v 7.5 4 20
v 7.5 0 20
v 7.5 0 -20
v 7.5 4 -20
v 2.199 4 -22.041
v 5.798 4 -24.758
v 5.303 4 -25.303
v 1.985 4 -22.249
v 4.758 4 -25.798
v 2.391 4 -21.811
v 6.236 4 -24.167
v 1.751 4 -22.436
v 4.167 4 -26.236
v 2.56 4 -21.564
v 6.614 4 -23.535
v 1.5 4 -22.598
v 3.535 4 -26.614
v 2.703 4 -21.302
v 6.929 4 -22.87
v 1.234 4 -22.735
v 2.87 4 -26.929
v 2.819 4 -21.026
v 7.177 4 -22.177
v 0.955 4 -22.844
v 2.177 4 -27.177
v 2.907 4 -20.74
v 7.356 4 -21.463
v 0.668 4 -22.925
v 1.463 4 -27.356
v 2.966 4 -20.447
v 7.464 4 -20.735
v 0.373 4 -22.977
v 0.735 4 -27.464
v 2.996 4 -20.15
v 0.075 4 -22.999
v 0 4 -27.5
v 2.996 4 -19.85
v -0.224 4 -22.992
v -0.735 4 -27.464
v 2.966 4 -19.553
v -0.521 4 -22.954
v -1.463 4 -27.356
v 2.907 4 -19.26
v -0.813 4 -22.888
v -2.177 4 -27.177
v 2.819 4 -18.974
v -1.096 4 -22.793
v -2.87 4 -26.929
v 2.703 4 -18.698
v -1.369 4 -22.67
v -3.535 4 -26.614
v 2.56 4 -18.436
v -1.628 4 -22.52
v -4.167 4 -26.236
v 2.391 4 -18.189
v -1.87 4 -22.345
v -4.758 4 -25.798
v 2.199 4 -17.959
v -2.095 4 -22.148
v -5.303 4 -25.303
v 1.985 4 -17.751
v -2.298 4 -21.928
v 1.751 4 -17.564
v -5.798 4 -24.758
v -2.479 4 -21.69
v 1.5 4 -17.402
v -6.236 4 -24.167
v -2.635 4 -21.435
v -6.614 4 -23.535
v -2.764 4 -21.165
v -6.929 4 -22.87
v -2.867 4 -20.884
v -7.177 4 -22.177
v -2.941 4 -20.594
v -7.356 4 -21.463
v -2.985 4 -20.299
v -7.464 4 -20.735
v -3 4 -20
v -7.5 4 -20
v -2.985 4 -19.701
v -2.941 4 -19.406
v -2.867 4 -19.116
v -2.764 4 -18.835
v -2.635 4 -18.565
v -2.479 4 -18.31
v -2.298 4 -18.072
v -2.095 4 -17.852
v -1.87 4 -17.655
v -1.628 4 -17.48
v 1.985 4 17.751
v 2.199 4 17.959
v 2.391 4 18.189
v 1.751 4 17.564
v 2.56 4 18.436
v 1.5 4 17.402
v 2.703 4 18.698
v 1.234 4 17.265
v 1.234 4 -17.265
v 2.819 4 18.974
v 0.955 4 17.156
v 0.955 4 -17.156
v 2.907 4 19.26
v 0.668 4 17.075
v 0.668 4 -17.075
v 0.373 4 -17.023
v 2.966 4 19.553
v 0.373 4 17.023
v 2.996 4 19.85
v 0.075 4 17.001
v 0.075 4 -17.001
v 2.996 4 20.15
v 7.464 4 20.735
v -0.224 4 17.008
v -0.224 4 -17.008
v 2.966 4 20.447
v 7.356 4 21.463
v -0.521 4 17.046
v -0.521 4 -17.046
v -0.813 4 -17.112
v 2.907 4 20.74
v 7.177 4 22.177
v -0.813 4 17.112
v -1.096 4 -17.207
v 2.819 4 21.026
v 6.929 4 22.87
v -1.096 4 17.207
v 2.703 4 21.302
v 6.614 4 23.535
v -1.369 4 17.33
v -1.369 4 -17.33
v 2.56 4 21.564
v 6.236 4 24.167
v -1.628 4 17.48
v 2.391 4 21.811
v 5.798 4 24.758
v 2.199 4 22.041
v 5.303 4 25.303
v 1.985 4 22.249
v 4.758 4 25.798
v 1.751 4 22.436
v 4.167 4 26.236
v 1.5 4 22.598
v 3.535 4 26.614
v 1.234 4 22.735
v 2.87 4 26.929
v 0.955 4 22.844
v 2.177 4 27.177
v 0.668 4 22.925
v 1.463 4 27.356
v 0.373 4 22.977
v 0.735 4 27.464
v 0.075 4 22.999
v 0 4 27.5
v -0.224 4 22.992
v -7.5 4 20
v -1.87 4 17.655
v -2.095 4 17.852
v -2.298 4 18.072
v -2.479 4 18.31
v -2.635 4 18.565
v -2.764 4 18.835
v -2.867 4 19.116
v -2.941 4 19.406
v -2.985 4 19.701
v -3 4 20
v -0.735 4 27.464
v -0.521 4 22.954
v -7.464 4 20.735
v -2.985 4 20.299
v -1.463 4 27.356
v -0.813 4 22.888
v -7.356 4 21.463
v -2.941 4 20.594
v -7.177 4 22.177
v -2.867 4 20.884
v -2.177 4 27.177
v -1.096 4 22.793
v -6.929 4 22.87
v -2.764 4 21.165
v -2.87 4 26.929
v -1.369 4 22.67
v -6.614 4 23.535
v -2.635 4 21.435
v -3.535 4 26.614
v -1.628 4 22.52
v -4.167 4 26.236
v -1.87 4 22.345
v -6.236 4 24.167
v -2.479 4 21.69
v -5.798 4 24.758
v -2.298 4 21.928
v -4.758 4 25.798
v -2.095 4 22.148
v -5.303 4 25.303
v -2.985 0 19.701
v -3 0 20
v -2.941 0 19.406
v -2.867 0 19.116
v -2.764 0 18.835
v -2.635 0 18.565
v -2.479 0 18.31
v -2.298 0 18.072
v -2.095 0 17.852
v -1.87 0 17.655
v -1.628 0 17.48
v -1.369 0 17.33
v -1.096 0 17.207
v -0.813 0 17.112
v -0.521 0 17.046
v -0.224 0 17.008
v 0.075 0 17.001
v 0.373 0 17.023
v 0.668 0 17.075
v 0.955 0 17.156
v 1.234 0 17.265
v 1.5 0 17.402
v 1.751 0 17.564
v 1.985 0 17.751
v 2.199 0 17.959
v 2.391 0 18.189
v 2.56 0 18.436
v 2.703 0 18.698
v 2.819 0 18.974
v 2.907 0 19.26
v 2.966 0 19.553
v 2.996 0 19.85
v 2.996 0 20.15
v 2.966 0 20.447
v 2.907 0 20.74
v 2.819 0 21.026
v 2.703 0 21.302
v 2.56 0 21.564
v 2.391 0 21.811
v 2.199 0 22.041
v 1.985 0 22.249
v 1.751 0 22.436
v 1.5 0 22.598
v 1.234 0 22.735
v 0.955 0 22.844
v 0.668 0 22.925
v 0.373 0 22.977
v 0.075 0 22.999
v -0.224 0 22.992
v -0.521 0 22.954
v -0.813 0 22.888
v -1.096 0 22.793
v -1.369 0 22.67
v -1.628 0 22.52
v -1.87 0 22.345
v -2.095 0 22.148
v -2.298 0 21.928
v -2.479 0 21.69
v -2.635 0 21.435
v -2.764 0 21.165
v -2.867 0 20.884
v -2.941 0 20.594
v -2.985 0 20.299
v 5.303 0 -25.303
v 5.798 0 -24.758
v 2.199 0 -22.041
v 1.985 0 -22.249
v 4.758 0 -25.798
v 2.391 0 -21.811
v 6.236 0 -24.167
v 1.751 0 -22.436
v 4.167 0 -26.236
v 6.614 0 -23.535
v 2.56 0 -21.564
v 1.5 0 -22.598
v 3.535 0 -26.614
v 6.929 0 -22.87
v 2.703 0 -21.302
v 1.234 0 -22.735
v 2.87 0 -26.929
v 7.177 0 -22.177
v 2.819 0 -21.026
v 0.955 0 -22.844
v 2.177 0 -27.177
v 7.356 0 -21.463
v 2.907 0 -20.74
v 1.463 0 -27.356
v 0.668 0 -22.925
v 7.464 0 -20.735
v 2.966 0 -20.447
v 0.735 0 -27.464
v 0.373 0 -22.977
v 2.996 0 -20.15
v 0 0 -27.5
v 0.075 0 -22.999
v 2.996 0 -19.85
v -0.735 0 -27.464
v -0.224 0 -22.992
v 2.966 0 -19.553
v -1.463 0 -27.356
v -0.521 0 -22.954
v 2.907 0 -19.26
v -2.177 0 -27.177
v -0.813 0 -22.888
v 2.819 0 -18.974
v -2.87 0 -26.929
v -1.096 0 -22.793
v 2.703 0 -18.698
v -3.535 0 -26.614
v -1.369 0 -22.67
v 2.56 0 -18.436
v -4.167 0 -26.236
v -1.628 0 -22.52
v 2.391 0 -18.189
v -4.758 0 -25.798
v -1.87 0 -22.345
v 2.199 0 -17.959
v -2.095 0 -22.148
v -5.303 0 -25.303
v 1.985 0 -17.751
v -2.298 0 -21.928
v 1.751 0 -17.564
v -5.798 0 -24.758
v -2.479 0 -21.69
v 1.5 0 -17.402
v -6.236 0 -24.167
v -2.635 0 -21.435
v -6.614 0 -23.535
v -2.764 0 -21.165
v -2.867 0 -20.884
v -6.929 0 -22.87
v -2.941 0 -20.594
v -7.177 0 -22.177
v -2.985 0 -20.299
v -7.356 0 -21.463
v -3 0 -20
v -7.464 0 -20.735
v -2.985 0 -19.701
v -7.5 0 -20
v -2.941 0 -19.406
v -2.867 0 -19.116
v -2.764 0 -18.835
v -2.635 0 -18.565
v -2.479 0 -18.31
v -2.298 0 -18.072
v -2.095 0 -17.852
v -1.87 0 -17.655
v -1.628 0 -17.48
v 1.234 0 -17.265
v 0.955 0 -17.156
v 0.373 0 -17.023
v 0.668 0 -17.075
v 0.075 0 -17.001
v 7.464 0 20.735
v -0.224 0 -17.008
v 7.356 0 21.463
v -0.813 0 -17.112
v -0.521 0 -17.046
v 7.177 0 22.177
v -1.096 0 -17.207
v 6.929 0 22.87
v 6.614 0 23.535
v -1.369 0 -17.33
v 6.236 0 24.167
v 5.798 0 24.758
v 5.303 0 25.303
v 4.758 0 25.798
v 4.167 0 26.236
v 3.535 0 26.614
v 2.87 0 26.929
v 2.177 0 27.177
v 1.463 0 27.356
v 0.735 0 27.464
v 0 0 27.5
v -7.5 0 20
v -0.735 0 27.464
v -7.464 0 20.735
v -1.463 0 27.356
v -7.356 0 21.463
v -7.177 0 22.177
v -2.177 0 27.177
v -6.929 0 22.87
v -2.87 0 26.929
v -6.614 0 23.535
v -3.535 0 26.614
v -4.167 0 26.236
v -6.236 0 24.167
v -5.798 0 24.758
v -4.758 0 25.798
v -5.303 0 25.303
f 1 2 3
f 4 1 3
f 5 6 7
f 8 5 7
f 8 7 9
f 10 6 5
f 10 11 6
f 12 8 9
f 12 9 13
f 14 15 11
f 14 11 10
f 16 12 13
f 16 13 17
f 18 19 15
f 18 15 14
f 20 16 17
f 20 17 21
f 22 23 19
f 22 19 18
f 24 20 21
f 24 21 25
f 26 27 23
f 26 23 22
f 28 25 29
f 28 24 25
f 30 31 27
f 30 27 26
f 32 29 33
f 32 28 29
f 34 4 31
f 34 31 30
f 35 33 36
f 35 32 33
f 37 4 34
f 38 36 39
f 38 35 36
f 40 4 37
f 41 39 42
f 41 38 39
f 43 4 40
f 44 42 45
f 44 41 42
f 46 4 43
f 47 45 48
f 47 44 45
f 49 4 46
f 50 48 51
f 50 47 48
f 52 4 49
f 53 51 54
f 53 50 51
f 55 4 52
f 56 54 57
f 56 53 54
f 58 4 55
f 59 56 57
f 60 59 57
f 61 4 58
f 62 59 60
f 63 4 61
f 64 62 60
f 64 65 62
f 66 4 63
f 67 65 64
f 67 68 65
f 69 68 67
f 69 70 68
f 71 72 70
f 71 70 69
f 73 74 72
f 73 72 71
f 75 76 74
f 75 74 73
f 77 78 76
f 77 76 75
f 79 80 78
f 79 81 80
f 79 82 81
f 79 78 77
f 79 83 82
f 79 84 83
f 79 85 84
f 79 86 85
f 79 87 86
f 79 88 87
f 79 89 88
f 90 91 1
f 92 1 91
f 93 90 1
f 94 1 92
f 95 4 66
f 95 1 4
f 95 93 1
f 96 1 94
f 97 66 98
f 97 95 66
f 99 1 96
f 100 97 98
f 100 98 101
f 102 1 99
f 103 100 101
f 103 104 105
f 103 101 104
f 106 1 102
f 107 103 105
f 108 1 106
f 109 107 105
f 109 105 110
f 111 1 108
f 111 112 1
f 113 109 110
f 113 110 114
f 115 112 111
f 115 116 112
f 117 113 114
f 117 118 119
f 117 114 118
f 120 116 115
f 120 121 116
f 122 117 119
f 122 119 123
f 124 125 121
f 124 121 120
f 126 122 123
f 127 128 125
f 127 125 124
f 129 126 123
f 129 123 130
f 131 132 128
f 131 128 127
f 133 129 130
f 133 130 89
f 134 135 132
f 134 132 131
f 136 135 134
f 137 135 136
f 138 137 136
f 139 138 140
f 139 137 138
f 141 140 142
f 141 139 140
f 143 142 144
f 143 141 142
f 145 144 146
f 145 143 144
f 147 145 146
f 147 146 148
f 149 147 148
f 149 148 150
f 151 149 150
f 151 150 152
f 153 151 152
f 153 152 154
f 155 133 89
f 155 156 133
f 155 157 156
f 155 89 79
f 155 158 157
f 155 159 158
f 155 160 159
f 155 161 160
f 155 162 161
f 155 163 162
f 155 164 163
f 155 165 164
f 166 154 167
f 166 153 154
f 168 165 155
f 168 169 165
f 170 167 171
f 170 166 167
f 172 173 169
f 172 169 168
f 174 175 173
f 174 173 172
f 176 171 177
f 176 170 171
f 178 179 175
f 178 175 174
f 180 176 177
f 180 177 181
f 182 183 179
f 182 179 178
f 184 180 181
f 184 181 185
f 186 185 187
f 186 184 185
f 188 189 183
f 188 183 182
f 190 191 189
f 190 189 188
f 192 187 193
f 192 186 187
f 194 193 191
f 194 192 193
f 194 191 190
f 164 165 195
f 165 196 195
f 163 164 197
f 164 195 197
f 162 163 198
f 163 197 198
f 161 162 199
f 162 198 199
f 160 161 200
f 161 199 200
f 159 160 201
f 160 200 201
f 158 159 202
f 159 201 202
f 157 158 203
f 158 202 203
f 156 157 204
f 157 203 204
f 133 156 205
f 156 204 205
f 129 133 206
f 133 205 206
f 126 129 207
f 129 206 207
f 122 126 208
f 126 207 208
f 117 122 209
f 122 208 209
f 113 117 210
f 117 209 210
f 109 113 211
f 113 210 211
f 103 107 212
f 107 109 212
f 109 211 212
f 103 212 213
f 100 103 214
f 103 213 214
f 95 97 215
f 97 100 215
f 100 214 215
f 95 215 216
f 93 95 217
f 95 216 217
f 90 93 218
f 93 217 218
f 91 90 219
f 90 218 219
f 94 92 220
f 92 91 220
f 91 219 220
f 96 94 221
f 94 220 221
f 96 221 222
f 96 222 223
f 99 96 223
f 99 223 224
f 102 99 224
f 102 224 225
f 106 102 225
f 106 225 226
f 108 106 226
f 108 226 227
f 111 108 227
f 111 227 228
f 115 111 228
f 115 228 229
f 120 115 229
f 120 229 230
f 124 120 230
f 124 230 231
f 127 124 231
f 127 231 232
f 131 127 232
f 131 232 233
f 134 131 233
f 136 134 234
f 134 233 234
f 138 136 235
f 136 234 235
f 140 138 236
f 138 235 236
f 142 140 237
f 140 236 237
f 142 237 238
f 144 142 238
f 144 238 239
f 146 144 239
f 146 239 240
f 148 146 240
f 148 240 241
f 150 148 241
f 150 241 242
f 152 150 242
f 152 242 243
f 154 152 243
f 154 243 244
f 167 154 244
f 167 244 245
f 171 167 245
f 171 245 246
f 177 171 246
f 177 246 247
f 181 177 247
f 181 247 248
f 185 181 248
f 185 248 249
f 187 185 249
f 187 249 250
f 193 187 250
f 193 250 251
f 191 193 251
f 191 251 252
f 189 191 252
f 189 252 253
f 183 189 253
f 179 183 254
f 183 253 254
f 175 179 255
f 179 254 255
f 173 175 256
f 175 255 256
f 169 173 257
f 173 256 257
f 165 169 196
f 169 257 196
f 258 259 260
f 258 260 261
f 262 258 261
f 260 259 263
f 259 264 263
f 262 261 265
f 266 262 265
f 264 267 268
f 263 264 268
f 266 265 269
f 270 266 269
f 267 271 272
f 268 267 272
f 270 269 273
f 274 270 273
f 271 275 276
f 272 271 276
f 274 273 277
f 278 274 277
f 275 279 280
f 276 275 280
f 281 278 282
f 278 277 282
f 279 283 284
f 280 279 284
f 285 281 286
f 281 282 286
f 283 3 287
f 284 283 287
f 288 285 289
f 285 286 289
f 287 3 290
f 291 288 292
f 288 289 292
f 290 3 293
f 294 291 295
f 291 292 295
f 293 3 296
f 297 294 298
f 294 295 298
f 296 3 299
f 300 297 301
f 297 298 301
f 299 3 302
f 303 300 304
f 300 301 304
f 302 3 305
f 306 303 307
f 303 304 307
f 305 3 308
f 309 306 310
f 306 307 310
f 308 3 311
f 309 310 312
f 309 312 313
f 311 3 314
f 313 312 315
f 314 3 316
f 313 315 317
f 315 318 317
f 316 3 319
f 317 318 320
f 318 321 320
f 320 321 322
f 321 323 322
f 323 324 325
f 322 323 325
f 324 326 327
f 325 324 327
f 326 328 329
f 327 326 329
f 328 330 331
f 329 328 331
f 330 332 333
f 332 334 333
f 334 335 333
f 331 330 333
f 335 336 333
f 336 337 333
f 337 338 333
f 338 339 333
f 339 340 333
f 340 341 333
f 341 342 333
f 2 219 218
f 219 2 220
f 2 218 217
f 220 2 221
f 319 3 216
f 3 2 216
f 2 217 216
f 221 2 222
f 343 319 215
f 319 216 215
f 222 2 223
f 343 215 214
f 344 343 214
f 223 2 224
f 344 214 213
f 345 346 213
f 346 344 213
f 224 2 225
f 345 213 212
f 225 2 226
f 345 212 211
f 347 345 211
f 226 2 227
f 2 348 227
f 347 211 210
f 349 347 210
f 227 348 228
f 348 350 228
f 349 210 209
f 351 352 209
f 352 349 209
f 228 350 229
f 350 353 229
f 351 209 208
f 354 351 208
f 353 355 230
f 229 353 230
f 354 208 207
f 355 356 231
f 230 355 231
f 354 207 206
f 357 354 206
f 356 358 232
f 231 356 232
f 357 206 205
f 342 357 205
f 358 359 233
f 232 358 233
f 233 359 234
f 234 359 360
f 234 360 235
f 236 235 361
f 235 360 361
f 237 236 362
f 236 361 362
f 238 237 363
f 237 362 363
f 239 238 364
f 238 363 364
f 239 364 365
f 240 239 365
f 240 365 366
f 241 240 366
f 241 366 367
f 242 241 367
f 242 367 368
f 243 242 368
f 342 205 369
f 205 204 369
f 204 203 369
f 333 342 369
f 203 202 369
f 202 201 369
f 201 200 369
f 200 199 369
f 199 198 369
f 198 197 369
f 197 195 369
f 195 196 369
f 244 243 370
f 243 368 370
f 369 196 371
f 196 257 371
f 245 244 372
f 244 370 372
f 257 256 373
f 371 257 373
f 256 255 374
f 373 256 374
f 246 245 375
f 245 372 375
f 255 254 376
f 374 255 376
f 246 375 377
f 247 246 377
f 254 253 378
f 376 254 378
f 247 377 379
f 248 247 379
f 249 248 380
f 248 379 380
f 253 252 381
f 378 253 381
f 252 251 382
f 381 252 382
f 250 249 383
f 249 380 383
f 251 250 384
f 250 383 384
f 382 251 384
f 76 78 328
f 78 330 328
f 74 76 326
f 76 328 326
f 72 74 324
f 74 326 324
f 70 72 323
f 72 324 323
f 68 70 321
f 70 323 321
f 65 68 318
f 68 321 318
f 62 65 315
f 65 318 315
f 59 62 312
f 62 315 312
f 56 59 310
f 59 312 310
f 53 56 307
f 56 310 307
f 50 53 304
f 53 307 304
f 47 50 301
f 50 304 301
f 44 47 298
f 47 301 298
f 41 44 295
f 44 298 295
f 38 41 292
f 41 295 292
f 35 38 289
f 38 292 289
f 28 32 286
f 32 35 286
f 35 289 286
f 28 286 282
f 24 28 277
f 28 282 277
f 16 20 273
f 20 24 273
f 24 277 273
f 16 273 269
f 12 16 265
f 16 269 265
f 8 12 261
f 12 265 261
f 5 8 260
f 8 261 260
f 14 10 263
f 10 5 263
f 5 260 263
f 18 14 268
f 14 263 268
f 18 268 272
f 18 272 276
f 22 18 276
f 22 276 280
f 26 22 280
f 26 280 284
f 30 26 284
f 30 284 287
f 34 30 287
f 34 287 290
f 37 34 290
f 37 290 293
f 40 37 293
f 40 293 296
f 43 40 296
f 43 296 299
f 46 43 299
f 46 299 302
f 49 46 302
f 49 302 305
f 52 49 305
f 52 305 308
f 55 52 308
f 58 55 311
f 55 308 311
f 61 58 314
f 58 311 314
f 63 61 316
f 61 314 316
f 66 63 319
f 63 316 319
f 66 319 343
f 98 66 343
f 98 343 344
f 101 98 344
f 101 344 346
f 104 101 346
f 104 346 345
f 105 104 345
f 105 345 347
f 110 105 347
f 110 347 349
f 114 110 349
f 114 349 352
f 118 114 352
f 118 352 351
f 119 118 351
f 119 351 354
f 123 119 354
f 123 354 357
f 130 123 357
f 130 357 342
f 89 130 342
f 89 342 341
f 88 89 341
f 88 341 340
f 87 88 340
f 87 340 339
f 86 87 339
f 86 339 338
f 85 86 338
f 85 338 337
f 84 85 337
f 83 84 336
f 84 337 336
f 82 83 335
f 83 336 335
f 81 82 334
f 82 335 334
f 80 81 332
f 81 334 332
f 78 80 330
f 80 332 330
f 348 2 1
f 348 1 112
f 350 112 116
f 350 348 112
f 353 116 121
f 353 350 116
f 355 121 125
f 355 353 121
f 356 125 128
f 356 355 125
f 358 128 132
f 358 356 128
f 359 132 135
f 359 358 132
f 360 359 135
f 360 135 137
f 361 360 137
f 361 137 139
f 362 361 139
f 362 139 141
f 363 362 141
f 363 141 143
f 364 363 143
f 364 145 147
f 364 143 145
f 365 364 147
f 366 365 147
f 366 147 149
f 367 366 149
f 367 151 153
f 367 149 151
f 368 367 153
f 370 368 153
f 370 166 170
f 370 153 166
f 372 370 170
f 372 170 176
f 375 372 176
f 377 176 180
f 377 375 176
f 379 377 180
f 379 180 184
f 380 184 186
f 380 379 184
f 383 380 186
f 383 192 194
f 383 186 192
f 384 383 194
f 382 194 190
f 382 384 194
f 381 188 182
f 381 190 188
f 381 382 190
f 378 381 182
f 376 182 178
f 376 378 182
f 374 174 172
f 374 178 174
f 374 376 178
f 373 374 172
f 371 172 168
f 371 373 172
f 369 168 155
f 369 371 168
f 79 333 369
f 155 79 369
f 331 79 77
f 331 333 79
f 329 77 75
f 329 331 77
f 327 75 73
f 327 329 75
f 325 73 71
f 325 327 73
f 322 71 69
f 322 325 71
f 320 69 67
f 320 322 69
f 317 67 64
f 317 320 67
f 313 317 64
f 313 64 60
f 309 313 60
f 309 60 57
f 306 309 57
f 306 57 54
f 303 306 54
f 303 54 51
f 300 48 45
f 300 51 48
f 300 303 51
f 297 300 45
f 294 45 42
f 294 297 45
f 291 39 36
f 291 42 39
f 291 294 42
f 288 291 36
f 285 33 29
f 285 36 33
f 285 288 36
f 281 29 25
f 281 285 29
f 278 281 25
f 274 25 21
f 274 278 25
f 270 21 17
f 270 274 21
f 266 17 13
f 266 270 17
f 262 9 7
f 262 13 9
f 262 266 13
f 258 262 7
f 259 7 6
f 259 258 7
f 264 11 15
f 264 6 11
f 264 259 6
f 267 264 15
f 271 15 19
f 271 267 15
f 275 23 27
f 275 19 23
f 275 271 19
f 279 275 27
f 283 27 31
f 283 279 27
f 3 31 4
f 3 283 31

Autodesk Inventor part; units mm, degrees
ref_plane "YZ Plane" through (0, 0, 0) normal (1, 0, 0) x (0, 1, 0)
ref_plane "XZ Plane" through (0, 0, 0) normal (0, 1, 0) x (-1, 0, 0)
ref_plane "XY Plane" through (0, 0, 0) normal (0, 0, 1) x (1, 0, 0)
sketch "Sketch1" plane through (0, 0, 0) normal (0, 1, 0) x (-1, 0, 0)
  line L0 (0, 20) -> (0, -20) construction
  line L1 (-7.5, 20) -> (-7.5, -20)
  line L2 (7.5, -20) -> (7.5, 20)
  arc A0 (7.5, 20) -> (-7.5, 20) centre (0, 20) ccw
  arc A1 (-7.5, -20) -> (7.5, -20) centre (0, -20) ccw
  line L3 (0, 0) -> (40, 0) construction
  circle A2 centre (0, -20) radius 3
  circle A3 centre (0, 20) radius 3
  dimension "d1" = 20
  dimension "d2" = 90
  dimension "d3" = 15
  dimension "d4" = 6
  dimension "d5" = 6
extrude "Extrusion1" add sketch "Sketch1" along normal blind 4
properties part number "Cable_Guide_Holder_Block"
